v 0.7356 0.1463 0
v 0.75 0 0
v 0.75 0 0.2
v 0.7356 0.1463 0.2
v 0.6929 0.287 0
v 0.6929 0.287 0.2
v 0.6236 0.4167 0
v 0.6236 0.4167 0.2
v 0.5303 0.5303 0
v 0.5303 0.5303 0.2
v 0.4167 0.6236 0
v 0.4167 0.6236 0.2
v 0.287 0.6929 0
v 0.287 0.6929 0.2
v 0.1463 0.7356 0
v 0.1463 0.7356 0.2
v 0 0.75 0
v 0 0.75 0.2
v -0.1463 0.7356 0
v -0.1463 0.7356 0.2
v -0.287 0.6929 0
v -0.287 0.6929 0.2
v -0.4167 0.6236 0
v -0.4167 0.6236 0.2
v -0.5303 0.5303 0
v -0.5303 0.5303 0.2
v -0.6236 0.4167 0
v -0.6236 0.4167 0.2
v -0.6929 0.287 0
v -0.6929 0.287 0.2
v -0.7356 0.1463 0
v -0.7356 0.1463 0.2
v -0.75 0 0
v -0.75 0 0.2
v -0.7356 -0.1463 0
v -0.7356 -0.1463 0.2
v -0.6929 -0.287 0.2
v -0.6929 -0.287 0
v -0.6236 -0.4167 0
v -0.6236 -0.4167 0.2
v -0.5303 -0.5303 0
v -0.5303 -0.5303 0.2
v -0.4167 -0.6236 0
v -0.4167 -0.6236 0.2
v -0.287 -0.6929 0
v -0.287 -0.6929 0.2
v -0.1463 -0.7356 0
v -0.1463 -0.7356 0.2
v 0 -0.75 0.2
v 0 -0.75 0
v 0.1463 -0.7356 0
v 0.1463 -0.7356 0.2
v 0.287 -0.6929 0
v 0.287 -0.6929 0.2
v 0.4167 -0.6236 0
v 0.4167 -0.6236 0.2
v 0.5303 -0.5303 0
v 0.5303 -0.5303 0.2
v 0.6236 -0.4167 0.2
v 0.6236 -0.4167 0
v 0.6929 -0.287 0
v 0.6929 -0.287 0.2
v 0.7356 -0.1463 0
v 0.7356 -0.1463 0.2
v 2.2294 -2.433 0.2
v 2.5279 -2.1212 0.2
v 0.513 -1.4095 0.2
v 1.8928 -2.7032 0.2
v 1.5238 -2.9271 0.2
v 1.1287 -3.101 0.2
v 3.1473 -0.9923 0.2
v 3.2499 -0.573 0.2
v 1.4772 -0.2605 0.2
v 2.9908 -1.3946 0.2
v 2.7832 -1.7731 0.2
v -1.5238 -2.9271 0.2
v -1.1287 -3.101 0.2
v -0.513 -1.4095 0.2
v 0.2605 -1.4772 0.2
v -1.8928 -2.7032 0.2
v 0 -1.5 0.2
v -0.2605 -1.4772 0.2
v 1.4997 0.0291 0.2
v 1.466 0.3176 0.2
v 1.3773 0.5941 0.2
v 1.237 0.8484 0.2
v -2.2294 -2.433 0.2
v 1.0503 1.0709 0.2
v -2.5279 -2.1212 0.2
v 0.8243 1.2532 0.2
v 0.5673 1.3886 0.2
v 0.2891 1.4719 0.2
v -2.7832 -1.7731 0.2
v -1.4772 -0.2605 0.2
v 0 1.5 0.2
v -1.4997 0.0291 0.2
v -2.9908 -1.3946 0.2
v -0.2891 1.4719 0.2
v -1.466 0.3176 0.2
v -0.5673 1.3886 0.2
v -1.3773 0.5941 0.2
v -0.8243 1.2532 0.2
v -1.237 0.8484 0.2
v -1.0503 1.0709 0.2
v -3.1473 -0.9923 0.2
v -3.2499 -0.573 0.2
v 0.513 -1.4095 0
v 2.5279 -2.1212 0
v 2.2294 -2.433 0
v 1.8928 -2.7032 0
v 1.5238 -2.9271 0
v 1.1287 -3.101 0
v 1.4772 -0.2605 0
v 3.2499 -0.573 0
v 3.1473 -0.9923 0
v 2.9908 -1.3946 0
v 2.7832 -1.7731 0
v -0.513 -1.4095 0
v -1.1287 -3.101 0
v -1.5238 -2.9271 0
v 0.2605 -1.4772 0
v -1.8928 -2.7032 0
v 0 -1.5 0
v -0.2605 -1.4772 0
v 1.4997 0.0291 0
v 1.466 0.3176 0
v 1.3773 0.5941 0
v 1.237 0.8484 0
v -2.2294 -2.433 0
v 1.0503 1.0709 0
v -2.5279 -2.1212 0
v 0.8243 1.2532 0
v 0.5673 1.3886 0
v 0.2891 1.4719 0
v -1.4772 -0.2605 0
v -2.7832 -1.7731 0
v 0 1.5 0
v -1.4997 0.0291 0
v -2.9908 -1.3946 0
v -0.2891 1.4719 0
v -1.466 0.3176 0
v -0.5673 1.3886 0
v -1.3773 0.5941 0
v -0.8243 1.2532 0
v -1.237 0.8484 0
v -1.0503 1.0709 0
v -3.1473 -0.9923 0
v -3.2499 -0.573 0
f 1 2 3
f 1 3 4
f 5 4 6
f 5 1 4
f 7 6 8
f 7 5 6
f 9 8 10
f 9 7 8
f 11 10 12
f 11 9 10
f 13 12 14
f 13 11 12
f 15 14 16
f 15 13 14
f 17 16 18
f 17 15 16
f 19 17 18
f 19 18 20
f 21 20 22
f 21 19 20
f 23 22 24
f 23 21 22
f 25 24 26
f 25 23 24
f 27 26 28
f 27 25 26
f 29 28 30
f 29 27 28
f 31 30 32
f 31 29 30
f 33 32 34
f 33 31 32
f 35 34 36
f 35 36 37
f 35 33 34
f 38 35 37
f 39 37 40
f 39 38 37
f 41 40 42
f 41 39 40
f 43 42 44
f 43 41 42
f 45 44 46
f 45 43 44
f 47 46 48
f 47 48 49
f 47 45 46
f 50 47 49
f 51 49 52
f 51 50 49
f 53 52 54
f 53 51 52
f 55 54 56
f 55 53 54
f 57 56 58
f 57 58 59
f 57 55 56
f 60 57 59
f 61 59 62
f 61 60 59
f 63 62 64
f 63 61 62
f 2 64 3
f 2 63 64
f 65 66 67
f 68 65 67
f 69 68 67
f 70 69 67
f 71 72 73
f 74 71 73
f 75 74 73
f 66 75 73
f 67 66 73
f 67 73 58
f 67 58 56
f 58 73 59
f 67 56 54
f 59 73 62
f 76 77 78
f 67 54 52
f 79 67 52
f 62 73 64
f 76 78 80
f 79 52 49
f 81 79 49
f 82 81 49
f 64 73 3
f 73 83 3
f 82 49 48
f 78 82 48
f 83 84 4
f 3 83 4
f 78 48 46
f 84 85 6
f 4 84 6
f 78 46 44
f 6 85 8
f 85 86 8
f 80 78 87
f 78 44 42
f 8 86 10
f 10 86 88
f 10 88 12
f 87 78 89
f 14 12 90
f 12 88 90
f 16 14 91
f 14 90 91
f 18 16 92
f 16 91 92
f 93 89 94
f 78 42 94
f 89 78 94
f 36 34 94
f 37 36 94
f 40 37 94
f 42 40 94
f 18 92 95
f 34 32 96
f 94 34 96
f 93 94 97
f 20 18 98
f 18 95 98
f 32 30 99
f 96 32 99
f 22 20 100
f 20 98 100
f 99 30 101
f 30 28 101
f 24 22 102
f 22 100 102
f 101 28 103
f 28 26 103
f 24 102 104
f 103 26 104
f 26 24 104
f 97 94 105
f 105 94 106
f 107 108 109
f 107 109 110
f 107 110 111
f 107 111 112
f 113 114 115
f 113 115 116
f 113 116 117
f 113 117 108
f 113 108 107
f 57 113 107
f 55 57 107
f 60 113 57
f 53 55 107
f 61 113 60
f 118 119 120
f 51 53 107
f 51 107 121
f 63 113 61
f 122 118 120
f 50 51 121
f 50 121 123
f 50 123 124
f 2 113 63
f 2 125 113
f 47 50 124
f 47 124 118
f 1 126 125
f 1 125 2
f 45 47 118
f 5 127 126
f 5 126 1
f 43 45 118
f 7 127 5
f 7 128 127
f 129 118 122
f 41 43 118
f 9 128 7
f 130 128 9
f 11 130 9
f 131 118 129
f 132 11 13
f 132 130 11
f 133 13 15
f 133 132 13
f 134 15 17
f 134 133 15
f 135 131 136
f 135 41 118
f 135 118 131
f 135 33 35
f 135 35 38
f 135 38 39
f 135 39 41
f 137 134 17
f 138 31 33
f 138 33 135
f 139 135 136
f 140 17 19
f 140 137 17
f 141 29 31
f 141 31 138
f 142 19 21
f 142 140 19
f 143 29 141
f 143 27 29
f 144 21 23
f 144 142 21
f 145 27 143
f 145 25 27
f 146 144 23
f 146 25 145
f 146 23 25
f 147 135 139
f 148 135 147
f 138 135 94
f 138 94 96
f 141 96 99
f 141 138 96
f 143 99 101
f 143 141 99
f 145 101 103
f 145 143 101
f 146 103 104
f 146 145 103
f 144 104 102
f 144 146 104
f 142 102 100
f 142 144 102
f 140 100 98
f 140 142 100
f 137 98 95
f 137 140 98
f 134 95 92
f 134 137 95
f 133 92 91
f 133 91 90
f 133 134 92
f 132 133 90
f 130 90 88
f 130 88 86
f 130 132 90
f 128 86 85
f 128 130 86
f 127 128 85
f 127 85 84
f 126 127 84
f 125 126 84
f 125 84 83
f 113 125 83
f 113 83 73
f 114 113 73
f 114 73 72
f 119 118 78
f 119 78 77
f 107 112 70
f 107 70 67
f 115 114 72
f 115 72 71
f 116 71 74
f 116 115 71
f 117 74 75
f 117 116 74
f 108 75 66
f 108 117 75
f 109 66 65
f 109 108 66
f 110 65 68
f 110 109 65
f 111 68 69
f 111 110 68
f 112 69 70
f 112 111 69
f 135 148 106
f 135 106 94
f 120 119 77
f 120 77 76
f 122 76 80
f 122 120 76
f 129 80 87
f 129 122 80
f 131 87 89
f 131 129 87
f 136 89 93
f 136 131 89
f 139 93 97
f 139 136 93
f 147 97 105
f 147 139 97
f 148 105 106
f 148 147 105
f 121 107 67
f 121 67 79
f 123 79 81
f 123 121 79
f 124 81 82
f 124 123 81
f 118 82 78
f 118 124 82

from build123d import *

# Parameters (mm, degrees)
SKETCH1_R           = 0.75
BOSS_EXTRUDE1_DEPTH = 0.2


with BuildPart() as part:
    # Sketch1 → Boss-Extrude1 (new body)
    with BuildSketch(Plane.XY):
        with BuildLine():
            Line((-0.513030215, -1.409538931), (-1.128666473, -3.100985649))
            ThreePointArc((-1.128666473, -3.100985649), (-2.527946662, -2.121199112), (-3.249865585, -0.573038986))
            Line((-3.249865585, -0.573038986), (-1.47721163, -0.260472267))
            ThreePointArc((-1.47721163, -0.260472267), (0, 1.5), (1.47721163, -0.260472267))
            Line((1.47721163, -0.260472267), (3.249865585, -0.573038986))
            ThreePointArc((3.249865585, -0.573038986), (2.527946662, -2.121199112), (1.128666473, -3.100985649))
            Line((1.128666473, -3.100985649), (0.513030215, -1.409538931))
            ThreePointArc((0.513030215, -1.409538931), (0, -1.5), (-0.513030215, -1.409538931))
        make_face()
        Circle(SKETCH1_R, mode=Mode.SUBTRACT)
    extrude(amount=BOSS_EXTRUDE1_DEPTH)


solid = part.part
